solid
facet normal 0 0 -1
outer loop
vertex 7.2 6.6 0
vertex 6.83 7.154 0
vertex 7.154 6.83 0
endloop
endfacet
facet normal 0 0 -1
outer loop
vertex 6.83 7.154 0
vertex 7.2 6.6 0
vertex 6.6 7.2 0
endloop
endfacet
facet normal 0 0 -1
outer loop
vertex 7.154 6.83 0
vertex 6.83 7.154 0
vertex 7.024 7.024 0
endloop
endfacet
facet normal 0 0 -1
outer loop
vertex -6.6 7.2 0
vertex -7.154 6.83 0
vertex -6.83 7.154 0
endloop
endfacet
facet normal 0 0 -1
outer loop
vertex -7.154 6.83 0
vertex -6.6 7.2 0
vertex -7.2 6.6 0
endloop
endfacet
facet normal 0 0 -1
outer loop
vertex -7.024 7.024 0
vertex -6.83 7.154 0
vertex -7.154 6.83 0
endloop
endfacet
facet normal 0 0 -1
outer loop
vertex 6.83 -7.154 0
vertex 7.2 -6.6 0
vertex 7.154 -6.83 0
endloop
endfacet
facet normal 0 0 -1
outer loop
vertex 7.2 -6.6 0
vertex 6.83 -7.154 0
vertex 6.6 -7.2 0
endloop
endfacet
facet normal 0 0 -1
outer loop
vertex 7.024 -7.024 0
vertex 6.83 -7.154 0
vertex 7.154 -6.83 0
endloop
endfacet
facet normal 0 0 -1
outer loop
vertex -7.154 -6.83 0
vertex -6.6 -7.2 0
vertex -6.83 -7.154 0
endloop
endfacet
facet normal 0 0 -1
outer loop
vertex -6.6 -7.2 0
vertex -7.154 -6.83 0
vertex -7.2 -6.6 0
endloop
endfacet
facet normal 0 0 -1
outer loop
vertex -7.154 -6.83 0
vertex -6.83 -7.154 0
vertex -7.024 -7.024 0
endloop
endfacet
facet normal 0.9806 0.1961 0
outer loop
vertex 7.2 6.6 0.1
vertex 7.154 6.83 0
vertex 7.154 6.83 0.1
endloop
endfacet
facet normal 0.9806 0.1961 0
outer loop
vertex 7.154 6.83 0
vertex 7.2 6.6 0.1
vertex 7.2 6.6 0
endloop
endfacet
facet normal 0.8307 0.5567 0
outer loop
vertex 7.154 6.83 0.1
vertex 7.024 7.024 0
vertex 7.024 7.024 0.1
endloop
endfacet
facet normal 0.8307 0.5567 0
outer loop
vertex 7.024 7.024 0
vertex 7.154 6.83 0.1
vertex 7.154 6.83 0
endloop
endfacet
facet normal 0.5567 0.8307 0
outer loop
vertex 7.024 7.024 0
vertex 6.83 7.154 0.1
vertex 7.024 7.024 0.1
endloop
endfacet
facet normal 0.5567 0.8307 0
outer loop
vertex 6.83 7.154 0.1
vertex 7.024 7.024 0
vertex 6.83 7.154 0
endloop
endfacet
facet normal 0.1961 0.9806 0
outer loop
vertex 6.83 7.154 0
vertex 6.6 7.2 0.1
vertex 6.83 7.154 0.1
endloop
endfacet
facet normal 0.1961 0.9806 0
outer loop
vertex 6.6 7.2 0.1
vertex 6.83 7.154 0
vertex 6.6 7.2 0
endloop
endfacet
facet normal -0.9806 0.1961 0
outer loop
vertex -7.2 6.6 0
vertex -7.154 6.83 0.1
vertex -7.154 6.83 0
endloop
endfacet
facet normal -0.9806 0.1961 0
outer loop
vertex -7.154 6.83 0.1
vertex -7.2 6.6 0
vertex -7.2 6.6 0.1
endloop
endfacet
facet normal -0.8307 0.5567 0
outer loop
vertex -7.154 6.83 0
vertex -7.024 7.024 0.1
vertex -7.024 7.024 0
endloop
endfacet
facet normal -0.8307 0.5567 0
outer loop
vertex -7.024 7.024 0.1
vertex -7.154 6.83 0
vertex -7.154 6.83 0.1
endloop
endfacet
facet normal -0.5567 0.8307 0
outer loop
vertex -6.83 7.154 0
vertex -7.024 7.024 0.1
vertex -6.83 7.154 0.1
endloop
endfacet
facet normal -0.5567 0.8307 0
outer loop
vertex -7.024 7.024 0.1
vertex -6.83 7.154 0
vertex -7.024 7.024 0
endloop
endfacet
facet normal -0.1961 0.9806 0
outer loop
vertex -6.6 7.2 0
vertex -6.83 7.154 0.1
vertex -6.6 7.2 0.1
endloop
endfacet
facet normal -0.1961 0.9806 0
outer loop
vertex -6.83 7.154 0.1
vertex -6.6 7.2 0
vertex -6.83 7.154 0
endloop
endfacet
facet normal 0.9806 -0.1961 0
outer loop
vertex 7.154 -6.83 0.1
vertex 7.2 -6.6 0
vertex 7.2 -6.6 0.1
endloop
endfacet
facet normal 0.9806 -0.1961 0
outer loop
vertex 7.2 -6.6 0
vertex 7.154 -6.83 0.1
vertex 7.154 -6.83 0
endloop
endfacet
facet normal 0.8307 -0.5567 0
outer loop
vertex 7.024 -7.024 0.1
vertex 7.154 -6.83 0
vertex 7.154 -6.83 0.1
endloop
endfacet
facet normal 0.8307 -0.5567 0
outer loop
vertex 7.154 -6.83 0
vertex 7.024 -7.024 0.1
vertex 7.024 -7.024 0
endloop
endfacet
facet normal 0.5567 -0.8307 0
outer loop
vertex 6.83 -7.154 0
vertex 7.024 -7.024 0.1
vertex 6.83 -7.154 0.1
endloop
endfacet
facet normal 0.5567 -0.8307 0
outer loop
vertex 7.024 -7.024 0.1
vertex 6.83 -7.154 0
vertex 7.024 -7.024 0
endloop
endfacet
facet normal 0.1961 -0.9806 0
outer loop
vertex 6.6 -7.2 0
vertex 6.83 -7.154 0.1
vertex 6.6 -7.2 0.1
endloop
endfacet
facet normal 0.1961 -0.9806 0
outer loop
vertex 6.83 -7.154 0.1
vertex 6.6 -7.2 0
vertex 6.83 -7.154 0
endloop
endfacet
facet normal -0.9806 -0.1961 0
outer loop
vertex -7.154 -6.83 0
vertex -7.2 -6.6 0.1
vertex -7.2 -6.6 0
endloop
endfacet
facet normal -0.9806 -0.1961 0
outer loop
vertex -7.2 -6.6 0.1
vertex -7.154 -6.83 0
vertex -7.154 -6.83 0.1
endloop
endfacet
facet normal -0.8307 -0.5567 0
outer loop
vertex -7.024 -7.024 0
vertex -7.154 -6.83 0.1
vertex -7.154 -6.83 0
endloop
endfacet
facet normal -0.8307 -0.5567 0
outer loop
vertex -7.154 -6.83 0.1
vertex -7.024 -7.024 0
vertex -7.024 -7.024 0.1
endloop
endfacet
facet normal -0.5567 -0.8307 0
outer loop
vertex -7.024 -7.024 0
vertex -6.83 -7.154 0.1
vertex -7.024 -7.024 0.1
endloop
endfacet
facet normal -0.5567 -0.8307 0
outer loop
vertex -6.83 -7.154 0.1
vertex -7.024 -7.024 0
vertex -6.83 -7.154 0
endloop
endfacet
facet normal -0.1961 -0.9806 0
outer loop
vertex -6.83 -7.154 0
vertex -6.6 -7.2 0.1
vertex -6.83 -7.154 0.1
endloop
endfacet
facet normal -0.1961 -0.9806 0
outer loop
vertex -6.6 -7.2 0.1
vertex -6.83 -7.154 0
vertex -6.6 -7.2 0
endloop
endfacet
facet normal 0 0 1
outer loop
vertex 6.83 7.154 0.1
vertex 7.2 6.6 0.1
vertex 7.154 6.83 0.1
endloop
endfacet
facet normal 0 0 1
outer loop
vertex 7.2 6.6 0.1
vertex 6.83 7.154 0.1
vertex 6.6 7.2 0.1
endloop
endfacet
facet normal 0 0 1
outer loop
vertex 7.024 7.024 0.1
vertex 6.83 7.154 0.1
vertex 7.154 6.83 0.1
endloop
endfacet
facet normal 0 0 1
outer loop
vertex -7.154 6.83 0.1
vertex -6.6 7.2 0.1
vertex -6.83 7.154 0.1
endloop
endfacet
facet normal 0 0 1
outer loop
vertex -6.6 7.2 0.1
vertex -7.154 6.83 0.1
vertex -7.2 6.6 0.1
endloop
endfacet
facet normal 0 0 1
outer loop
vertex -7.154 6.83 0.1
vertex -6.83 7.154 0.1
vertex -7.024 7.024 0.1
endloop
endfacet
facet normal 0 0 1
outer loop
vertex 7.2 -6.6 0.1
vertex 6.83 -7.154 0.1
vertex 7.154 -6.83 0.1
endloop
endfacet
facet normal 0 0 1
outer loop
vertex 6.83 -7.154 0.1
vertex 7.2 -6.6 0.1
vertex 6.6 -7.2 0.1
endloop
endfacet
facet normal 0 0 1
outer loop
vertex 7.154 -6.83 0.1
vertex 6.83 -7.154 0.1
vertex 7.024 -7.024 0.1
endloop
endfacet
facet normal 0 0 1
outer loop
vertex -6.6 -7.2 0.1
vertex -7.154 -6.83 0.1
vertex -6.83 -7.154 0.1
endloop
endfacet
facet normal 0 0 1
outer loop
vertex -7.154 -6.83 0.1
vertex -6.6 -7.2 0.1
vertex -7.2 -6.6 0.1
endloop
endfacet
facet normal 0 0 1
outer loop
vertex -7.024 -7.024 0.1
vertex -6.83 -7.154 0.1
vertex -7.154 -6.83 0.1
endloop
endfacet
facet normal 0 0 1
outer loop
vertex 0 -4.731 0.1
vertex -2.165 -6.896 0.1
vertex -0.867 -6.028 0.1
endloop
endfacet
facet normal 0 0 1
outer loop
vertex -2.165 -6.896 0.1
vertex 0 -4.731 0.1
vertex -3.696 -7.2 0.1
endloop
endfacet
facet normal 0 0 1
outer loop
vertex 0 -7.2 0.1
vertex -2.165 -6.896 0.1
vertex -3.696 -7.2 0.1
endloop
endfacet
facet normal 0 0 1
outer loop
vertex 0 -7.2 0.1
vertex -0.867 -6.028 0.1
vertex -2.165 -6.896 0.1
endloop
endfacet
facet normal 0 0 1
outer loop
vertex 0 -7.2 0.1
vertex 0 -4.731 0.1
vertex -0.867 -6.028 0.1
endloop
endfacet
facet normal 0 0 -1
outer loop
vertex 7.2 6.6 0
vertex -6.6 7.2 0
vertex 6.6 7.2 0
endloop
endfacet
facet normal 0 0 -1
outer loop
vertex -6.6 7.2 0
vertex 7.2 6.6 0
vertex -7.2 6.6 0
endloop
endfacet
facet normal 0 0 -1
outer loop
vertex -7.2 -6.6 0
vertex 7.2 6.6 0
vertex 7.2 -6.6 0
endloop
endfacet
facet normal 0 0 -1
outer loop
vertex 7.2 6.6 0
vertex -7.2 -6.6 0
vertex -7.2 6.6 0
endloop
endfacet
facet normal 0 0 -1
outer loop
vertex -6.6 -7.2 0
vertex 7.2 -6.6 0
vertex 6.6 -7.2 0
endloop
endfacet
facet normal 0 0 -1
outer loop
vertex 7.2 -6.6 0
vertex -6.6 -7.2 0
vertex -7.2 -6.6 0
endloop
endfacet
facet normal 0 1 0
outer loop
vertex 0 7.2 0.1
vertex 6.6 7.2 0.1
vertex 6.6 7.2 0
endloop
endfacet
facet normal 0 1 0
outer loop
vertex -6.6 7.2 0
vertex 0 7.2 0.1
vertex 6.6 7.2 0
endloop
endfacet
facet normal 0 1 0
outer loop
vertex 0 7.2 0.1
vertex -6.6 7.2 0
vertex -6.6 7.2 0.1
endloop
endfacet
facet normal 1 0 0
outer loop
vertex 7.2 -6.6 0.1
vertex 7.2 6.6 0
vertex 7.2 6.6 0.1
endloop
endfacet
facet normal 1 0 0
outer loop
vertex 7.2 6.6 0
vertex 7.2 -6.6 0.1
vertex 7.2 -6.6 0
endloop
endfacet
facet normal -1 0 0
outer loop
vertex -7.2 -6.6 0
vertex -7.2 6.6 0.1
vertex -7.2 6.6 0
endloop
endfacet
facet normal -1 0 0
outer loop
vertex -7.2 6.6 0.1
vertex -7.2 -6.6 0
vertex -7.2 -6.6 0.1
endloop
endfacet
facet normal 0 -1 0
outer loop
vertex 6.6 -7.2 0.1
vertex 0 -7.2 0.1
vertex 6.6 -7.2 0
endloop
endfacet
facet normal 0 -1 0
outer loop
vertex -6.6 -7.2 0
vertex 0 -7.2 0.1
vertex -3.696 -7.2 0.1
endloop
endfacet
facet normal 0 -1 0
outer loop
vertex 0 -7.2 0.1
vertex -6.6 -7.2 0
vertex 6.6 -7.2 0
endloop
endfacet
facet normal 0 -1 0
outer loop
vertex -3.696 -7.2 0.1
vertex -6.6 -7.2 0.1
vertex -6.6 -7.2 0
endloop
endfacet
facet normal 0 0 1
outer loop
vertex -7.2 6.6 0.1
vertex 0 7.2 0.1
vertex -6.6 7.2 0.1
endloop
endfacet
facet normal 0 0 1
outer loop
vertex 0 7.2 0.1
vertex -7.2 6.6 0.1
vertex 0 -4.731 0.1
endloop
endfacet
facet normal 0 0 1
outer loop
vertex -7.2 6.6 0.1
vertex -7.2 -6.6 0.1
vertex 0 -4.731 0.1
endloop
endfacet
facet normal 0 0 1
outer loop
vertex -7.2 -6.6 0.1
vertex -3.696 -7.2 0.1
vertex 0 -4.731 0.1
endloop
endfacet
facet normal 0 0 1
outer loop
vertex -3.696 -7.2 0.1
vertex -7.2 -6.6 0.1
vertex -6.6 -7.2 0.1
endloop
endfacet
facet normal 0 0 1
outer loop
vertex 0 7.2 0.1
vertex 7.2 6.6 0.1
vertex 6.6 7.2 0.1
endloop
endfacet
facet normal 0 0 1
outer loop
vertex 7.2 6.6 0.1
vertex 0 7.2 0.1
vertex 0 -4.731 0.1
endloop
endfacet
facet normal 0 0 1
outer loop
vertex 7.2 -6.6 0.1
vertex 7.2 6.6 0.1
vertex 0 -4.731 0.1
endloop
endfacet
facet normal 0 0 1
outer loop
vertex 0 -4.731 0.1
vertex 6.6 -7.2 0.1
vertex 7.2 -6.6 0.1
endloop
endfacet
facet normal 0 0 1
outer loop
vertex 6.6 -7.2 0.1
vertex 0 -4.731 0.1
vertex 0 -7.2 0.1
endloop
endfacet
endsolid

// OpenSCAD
// file: ../p/3-16tndis.scad
use <../lib.scad>
function ldraw_lib__3_16tndis() = [
// 0 Disc Negative Truncated 0.1875
// 0 Name: 3-16tndis.dat
// 0 Author: Massimo Maso [Sirio]
// 0 !LDRAW_ORG Primitive UPDATE 2022-02
// 0 !LICENSE Licensed under CC BY 4.0 : see CAreadme.txt
// 
// 0 BFC CERTIFY CCW
  [0,"BFC","CERTIFY"],
  [0,"BFC","CCW"],
// 
// 0 !HISTORY 2022-03-06 [PTadmin] Official Update 2022-02
// 
// 
// 3 16 1 0 .9239 .9239 0 .3827 1 0 0
  [3,16,1,0,.9239,.9239,0,.3827,1,0,0],
// 3 16 1 0 .9239 .7071 0 .7071 .9239 0 .3827
  [3,16,1,0,.9239,.7071,0,.7071,.9239,0,.3827],
// 3 16 1 0 .9239 .3827 0 .9239 .7071 0 .7071
  [3,16,1,0,.9239,.3827,0,.9239,.7071,0,.7071],
];
module ldraw_lib__3_16tndis(step=0, col=false, unit=2/5, alt=false, line=0.2, solid=!$preview)
    makepoly(ldraw_lib__3_16tndis(), step=step, col=col, unit=unit, alt=alt, line=line, solid=solid);
ldraw_lib__3_16tndis(line=0.2);
// file: ../p/3-16chrd.scad
use <../lib.scad>
function ldraw_lib__3_16chrd() = [
// 0 Chord 0.1875
// 0 Name: 3-16chrd.dat
// 0 Author: Niels Karsdorp [nielsk]
// 0 !LDRAW_ORG Primitive UPDATE 2009-01
// 0 !LICENSE Licensed under CC BY 2.0 and CC BY 4.0 : see CAreadme.txt
// 
// 0 BFC CERTIFY CCW
  [0,"BFC","CERTIFY"],
  [0,"BFC","CCW"],
// 
// 0 !HISTORY 2009-05-02 [PTadmin] Official Update 2009-01
// 
// 
// 4 16 1 0 0 0.9239 0 0.3827 0.7071 0 0.7071 0.3827 0 0.9239
  [4,16,1,0,0,0.9239,0,0.3827,0.7071,0,0.7071,0.3827,0,0.9239],
// 0
// 
];
module ldraw_lib__3_16chrd(step=0, col=false, unit=2/5, alt=false, line=0.2, solid=!$preview)
    makepoly(ldraw_lib__3_16chrd(), step=step, col=col, unit=unit, alt=alt, line=line, solid=solid);
ldraw_lib__3_16chrd(line=0.2);
// file: ../p/1-4cyli.scad
use <../lib.scad>
function ldraw_lib__1_4cyli() = [
// 0 Cylinder 0.25
// 0 Name: 1-4cyli.dat
// 0 Author: James Jessiman
// 0 !LDRAW_ORG Primitive UPDATE 2012-01
// 0 !LICENSE Licensed under CC BY 4.0 : see CAreadme.txt
// 
// 0 BFC CERTIFY CCW
  [0,"BFC","CERTIFY"],
  [0,"BFC","CCW"],
// 
// 0 !HISTORY 2002-03-23 [sbliss] Added BFC statement.
// 0 !HISTORY 2002-04-25 [PTadmin] Official Update 2002-02
// 0 !HISTORY 2007-06-22 [PTadmin] Header formatted for Contributor Agreement
// 0 !HISTORY 2008-07-01 [PTadmin] Official Update 2008-01
// 0 !HISTORY 2012-02-16 [Philo] Changed to CCW
// 0 !HISTORY 2012-03-30 [PTadmin] Official Update 2012-01
// 
// 
// 4 16 1 1 0 0.9239 1 0.3827 0.9239 0 0.3827 1 0 0
  [4,16,1,1,0,0.9239,1,0.3827,0.9239,0,0.3827,1,0,0],
// 5 24 1 0 0 1 1 0 0.9239 0 0.3827 1 0 -1
  [5,24,1,0,0,1,1,0,0.9239,0,0.3827,1,0,-1],
// 4 16 0.9239 1 0.3827 0.7071 1 0.7071 0.7071 0 0.7071 0.9239 0 0.3827
  [4,16,0.9239,1,0.3827,0.7071,1,0.7071,0.7071,0,0.7071,0.9239,0,0.3827],
// 5 24 0.9239 0 0.3827 0.9239 1 0.3827 0.7071 0 0.7071 1 0 0
  [5,24,0.9239,0,0.3827,0.9239,1,0.3827,0.7071,0,0.7071,1,0,0],
// 4 16 0.7071 1 0.7071 0.3827 1 0.9239 0.3827 0 0.9239 0.7071 0 0.7071
  [4,16,0.7071,1,0.7071,0.3827,1,0.9239,0.3827,0,0.9239,0.7071,0,0.7071],
// 5 24 0.7071 0 0.7071 0.7071 1 0.7071 0.3827 0 0.9239 0.9239 0 0.3827
  [5,24,0.7071,0,0.7071,0.7071,1,0.7071,0.3827,0,0.9239,0.9239,0,0.3827],
// 4 16 0.3827 1 0.9239 0 1 1 0 0 1 0.3827 0 0.9239
  [4,16,0.3827,1,0.9239,0,1,1,0,0,1,0.3827,0,0.9239],
// 5 24 0.3827 0 0.9239 0.3827 1 0.9239 0 0 1 0.7071 0 0.7071
  [5,24,0.3827,0,0.9239,0.3827,1,0.9239,0,0,1,0.7071,0,0.7071],
// 5 24 0 0 1 0 1 1 0.3827 0 0.9239 -1 0 1
  [5,24,0,0,1,0,1,1,0.3827,0,0.9239,-1,0,1],
];
module ldraw_lib__1_4cyli(step=0, col=false, unit=2/5, alt=false, line=0.2, solid=!$preview)
    makepoly(ldraw_lib__1_4cyli(), step=step, col=col, unit=unit, alt=alt, line=line, solid=solid);
ldraw_lib__1_4cyli(line=0.2);
// file: ../p/1-4chrd.scad
use <../lib.scad>
function ldraw_lib__1_4chrd() = [
// 0 Chord 0.25
// 0 Name: 1-4chrd.dat
// 0 Author: Tony Hafner [hafhead]
// 0 !LDRAW_ORG Primitive UPDATE 2012-02
// 0 !LICENSE Licensed under CC BY 2.0 and CC BY 4.0 : see CAreadme.txt
// 
// 0 BFC CERTIFY CCW
  [0,"BFC","CERTIFY"],
  [0,"BFC","CCW"],
// 
// 0 !HISTORY 2004-04-22 [PTadmin] Official Update 2004-02
// 0 !HISTORY 2007-10-09 [PTadmin] Header formatted for Contributor Agreement
// 0 !HISTORY 2008-07-01 [PTadmin] Official Update 2008-01
// 0 !HISTORY 2012-08-02 [MMR1988] Re-creation with PrimGen2 and Rectifier
// 0 !HISTORY 2012-08-09 [PTadmin] Official Update 2012-02
// 
// 
// 4 16 0.9239 0 0.3827 0.3827 0 0.9239 0 0 1 1 0 0
  [4,16,0.9239,0,0.3827,0.3827,0,0.9239,0,0,1,1,0,0],
// 3 16 0.7071 0 0.7071 0.3827 0 0.9239 0.9239 0 0.3827
  [3,16,0.7071,0,0.7071,0.3827,0,0.9239,0.9239,0,0.3827],
];
module ldraw_lib__1_4chrd(step=0, col=false, unit=2/5, alt=false, line=0.2, solid=!$preview)
    makepoly(ldraw_lib__1_4chrd(), step=step, col=col, unit=unit, alt=alt, line=line, solid=solid);
ldraw_lib__1_4chrd(line=0.2);
// file: 6141875o.scad
use <../lib.scad>
use <../p/1-4chrd.scad>
use <../p/1-4cyli.scad>
use <../p/3-16chrd.scad>
use <../p/3-16tndis.scad>
function ldraw_lib__6141875o() = [
// 0 Sticker  1.8 x  1.8 with Black Trapezoid on Blue Background Right
// 0 Name: 6141875o.dat
// 0 Author: Massimo Maso [Sirio]
// 0 !LDRAW_ORG Part UPDATE 2022-06
// 0 !LICENSE Licensed under CC BY 4.0 : see CAreadme.txt
// 
// 0 BFC CERTIFY CCW
  [0,"BFC","CERTIFY"],
  [0,"BFC","CCW"],
// 
// 0 !KEYWORDS Bricklink 75875stk01, Brickowl 53567, F-150, Ford, Raptor
// 0 !KEYWORDS Rebrickable 24760, Set 75875, Speed Champions
// 
// 0 !HISTORY 2022-12-20 [PTadmin] Official Update 2022-06
// 
// 
// 0 // Primitives
// 
// 1 16 -16.5 0 16.5 -1.5 0 0 0 -1 0 0 0 1.5 1-4chrd.dat
  [1,16,-16.5,0,16.5,-1.5,0,0,0,-1,0,0,0,1.5, ldraw_lib__1_4chrd()],
// 1 16 16.5 0 16.5 1.5 0 0 0 -1 0 0 0 1.5 1-4chrd.dat
  [1,16,16.5,0,16.5,1.5,0,0,0,-1,0,0,0,1.5, ldraw_lib__1_4chrd()],
// 1 16 -16.5 0 -16.5 -1.5 0 0 0 -1 0 0 0 -1.5 1-4chrd.dat
  [1,16,-16.5,0,-16.5,-1.5,0,0,0,-1,0,0,0,-1.5, ldraw_lib__1_4chrd()],
// 1 16 16.5 0 -16.5 1.5 0 0 0 -1 0 0 0 -1.5 1-4chrd.dat
  [1,16,16.5,0,-16.5,1.5,0,0,0,-1,0,0,0,-1.5, ldraw_lib__1_4chrd()],
// 1 16 -16.5 0 16.5 -1.5 0 0 0 -.25 0 0 0 1.5 1-4cyli.dat
  [1,16,-16.5,0,16.5,-1.5,0,0,0,-.25,0,0,0,1.5, ldraw_lib__1_4cyli()],
// 1 16 16.5 0 16.5 1.5 0 0 0 -.25 0 0 0 1.5 1-4cyli.dat
  [1,16,16.5,0,16.5,1.5,0,0,0,-.25,0,0,0,1.5, ldraw_lib__1_4cyli()],
// 1 16 -16.5 0 -16.5 -1.5 0 0 0 -.25 0 0 0 -1.5 1-4cyli.dat
  [1,16,-16.5,0,-16.5,-1.5,0,0,0,-.25,0,0,0,-1.5, ldraw_lib__1_4cyli()],
// 1 16 16.5 0 -16.5 1.5 0 0 0 -.25 0 0 0 -1.5 1-4cyli.dat
  [1,16,16.5,0,-16.5,1.5,0,0,0,-.25,0,0,0,-1.5, ldraw_lib__1_4cyli()],
// 1 1 -16.5 -.25 16.5 -1.5 0 0 0 1 0 0 0 1.5 1-4chrd.dat
  [1,1,-16.5,-.25,16.5,-1.5,0,0,0,1,0,0,0,1.5, ldraw_lib__1_4chrd()],
// 1 0 16.5 -.25 16.5 1.5 0 0 0 1 0 0 0 1.5 1-4chrd.dat
  [1,0,16.5,-.25,16.5,1.5,0,0,0,1,0,0,0,1.5, ldraw_lib__1_4chrd()],
// 1 1 -16.5 -.25 -16.5 -1.5 0 0 0 1 0 0 0 -1.5 1-4chrd.dat
  [1,1,-16.5,-.25,-16.5,-1.5,0,0,0,1,0,0,0,-1.5, ldraw_lib__1_4chrd()],
// 1 0 16.5 -.25 -16.5 1.5 0 0 0 1 0 0 0 -1.5 1-4chrd.dat
  [1,0,16.5,-.25,-16.5,1.5,0,0,0,1,0,0,0,-1.5, ldraw_lib__1_4chrd()],
// 1 0 9.239 -.25 -8 0 0 -10 0 1 0 -10 0 0 3-16chrd.dat
  [1,0,9.239,-.25,-8,0,0,-10,0,1,0,-10,0,0, ldraw_lib__3_16chrd()],
// 1 1 9.239 -.25 -8 0 0 -10 0 1 0 -10 0 0 3-16tndis.dat
  [1,1,9.239,-.25,-8,0,0,-10,0,1,0,-10,0,0, ldraw_lib__3_16tndis()],
// 0 // Bottom face
// 4 16 16.5 0 18 18 0 16.5 -18 0 16.5 -16.5 0 18
  [4,16,16.5,0,18,18,0,16.5,-18,0,16.5,-16.5,0,18],
// 4 16 18 0 16.5 18 0 -16.5 -18 0 -16.5 -18 0 16.5
  [4,16,18,0,16.5,18,0,-16.5,-18,0,-16.5,-18,0,16.5],
// 4 16 16.5 0 -18 -16.5 0 -18 -18 0 -16.5 18 0 -16.5
  [4,16,16.5,0,-18,-16.5,0,-18,-18,0,-16.5,18,0,-16.5],
// 0 // Lateral face
// 3 16 -16.5 0 18 -16.5 -.25 18 0 -.25 18
  [3,16,-16.5,0,18,-16.5,-.25,18,0,-.25,18],
// 4 16 -16.5 0 18 0 -.25 18 16.5 -.25 18 16.5 0 18
  [4,16,-16.5,0,18,0,-.25,18,16.5,-.25,18,16.5,0,18],
// 4 16 -18 0 16.5 -18 0 -16.5 -18 -.25 -16.5 -18 -.25 16.5
  [4,16,-18,0,16.5,-18,0,-16.5,-18,-.25,-16.5,-18,-.25,16.5],
// 4 16 18 0 16.5 18 -.25 16.5 18 -.25 -16.5 18 0 -16.5
  [4,16,18,0,16.5,18,-.25,16.5,18,-.25,-16.5,18,0,-16.5],
// 3 16 -16.5 0 -18 0 -.25 -18 -16.5 -.25 -18
  [3,16,-16.5,0,-18,0,-.25,-18,-16.5,-.25,-18],
// 4 16 -16.5 0 -18 16.5 0 -18 9.239 -.25 -18 0 -.25 -18
  [4,16,-16.5,0,-18,16.5,0,-18,9.239,-.25,-18,0,-.25,-18],
// 3 16 16.5 0 -18 16.5 -.25 -18 9.239 -.25 -18
  [3,16,16.5,0,-18,16.5,-.25,-18,9.239,-.25,-18],
// 0 // Top face
// 0 // Black faces
// 4 0 0 -.25 -11.827 18 -.25 16.5 16.5 -.25 18 0 -.25 18
  [4,0,0,-.25,-11.827,18,-.25,16.5,16.5,-.25,18,0,-.25,18],
// 3 0 0 -.25 -11.827 18 -.25 -16.5 18 -.25 16.5
  [3,0,0,-.25,-11.827,18,-.25,-16.5,18,-.25,16.5],
// 4 0 0 -.25 -11.827 9.239 -.25 -18 16.5 -.25 -18 18 -.25 -16.5
  [4,0,0,-.25,-11.827,9.239,-.25,-18,16.5,-.25,-18,18,-.25,-16.5],
// 0 // Blue faces
// 4 1 0 -.25 -11.827 0 -.25 18 -16.5 -.25 18 -18 -.25 16.5
  [4,1,0,-.25,-11.827,0,-.25,18,-16.5,-.25,18,-18,-.25,16.5],
// 3 1 0 -.25 -11.827 -18 -.25 16.5 -18 -.25 -16.5
  [3,1,0,-.25,-11.827,-18,-.25,16.5,-18,-.25,-16.5],
// 4 1 0 -.25 -11.827 -18 -.25 -16.5 -16.5 -.25 -18 0 -.25 -18
  [4,1,0,-.25,-11.827,-18,-.25,-16.5,-16.5,-.25,-18,0,-.25,-18],
];
module ldraw_lib__6141875o(step=0, col=false, unit=2/5, alt=false, line=0.2, solid=!$preview)
    makepoly(ldraw_lib__6141875o(), step=step, col=col, unit=unit, alt=alt, line=line, solid=solid);
ldraw_lib__6141875o(line=0.2);
// main file
use <../lib.scad>
use <6141875o.scad>
function ldraw_lib__6141875t() = [
// 0 Sticker  1.8 x  1.8 with Black Trapezoid on Blue Background Left
// 0 Name: 6141875t.dat
// 0 Author: Massimo Maso [Sirio]
// 0 !LDRAW_ORG Part UPDATE 2022-06
// 0 !LICENSE Licensed under CC BY 4.0 : see CAreadme.txt
// 
// 0 BFC CERTIFY CCW
  [0,"BFC","CERTIFY"],
  [0,"BFC","CCW"],
// 
// 0 !KEYWORDS Bricklink 75875stk01, Brickowl 53567, F-150, Ford, Raptor
// 0 !KEYWORDS Rebrickable 24760, Set 75875, Speed Champions
// 
// 0 !HISTORY 2022-12-20 [PTadmin] Official Update 2022-06
// 
// 
// 1 16 0 0 0 -1 0 0 0 1 0 0 0 1 6141875o.dat
  [1,16,0,0,0,-1,0,0,0,1,0,0,0,1, ldraw_lib__6141875o()],
];
module ldraw_lib__6141875t(step=0, col=false, unit=2/5, alt=false, line=0.2, solid=!$preview)
    makepoly(ldraw_lib__6141875t(), step=step, col=col, unit=unit, alt=alt, line=line, solid=solid);
ldraw_lib__6141875t(line=0.2);
